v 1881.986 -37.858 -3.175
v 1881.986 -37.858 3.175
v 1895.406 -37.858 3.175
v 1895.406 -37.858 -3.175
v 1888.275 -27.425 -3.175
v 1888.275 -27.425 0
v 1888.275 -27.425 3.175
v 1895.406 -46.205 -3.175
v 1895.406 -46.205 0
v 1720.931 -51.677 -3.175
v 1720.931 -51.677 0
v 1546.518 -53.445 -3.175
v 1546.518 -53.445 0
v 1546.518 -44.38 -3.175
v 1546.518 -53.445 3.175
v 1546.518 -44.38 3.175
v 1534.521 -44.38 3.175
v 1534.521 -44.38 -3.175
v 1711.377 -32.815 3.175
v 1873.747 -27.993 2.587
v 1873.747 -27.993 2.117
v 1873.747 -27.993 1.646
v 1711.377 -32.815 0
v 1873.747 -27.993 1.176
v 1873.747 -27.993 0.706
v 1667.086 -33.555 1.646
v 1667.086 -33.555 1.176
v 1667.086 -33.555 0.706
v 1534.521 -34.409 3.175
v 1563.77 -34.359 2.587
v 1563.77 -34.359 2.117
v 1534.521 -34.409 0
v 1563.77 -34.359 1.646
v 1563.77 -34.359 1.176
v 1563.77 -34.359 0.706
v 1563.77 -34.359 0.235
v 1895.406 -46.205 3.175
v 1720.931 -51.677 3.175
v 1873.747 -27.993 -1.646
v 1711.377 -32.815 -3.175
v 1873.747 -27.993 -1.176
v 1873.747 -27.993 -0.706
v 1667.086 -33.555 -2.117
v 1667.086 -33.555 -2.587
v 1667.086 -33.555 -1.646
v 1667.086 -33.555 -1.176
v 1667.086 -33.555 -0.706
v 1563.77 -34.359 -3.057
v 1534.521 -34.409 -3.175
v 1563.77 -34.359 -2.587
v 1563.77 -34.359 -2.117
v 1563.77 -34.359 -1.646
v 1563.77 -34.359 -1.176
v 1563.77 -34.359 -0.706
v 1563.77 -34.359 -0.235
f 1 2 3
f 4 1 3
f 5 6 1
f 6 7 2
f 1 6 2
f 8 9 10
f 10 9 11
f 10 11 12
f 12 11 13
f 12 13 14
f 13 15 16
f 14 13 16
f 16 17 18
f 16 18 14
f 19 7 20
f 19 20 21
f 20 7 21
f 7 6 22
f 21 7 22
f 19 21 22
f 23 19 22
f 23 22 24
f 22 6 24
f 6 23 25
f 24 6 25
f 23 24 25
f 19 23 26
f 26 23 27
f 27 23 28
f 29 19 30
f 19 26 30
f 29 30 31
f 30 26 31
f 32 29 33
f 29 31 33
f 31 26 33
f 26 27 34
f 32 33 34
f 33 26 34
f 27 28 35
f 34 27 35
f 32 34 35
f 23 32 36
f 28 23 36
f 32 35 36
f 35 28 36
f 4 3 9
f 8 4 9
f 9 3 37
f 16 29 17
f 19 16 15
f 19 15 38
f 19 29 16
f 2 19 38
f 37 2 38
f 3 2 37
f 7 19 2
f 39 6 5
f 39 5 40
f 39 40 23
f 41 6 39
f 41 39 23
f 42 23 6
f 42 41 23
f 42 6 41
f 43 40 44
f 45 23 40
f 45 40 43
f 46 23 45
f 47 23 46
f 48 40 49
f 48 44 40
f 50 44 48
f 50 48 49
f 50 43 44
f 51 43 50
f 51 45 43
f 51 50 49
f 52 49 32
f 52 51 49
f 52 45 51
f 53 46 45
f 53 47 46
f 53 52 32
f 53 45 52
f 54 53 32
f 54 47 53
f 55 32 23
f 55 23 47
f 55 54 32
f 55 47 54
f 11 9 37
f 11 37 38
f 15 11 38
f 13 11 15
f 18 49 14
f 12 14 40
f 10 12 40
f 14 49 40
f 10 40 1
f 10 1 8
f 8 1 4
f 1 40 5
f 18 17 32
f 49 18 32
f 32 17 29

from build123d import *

# Parameters (mm, degrees)
BOSS_EXTRUDE1_DEPTH = 3.175
CUT_EXTRUDE1_DEPTH  = 7.3500001
FILLET1_R           = 2.54
CUT_EXTRUDE2_DEPTH  = 7.62


with BuildPart() as part:
    # Sketch1 → Boss-Extrude1 (new body, symmetric)
    with BuildSketch(Plane.XY):
        with BuildLine():
            Line((499.61002795, -53.470702797), (1046.28548189, -53.470702797))
            add(Edge.make_bspline(
                [(2669.54, -9.569049356), (2615.393603553, -13.17073937), (2561.080658619, -16.536108081), (2506.205230446, -19.758621957), (2430.209106802, -23.505211705), (2354.212983157, -26.631486423), (2332.570330468, -27.480988169), (2156.268639429, -34.377768543), (1979.966947376, -41.628631248), (1824.114277635, -52.771265877), (1636.928606778, -53.579569849), (1449.742935921, -53.454024613), (1418.006730935, -53.470702797), (1324.899336146, -53.470702797), (1231.791940344, -53.470702797), (1170.441269319, -53.470702797), (1108.784075813, -53.470702797), (1047.126882346, -53.470702797), (1046.846414188, -53.470702797), (1046.565947184, -53.470702797), (1046.28548189, -53.470702797)],
                knots=[103.698913506, 103.698913506, 103.698913506, 103.698913506, 103.698913506, 103.698913506, 130.927896619, 130.927896619, 130.927896619, 141.337054719, 141.337054719, 141.337054719, 218.101815019, 218.101815019, 218.101815019, 233.772059419, 233.772059419, 233.772059419, 264.077723219, 264.077723219, 264.077723219, 264.2162088, 264.2162088, 264.2162088, 264.2162088, 264.2162088, 264.2162088], degree=5))
            Line((2669.54, -9.569049356), (2669.54, 9.5231025))
            add(Edge.make_bspline(
                [(2669.54, 9.5231025), (2667.126494524, 9.36235515), (2659.861586685, 8.880281494), (2635.666282302, 7.292469146), (2596.857665529, 4.826056853), (2545.729743039, 1.758344093), (2494.405305707, -1.098555235), (2451.533022267, -3.266573297), (2417.198316756, -4.86708361), (2391.457076919, -6.003589235), (2365.634736307, -7.086854581), (2339.546284672, -8.137729944), (2313.466132974, -9.165138371), (2287.612375486, -10.179478215), (2261.763347437, -11.201032297), (2227.285329715, -12.583842557), (2184.175569393, -14.36607236), (2132.429066114, -16.607427868), (2063.4255234, -19.708920485), (1977.174907635, -23.700543313), (1873.732451432, -28.149389221), (1770.37461881, -31.657468649), (1667.085687813, -33.793117556), (1581.011094491, -34.383188831), (1512.07397126, -34.4278026), (1443.061513477, -34.409510402), (1356.800927879, -34.424432812), (1218.794626954, -34.418464788), (1115.289022786, -34.420702797), (1046.28548189, -34.420702797)],
                knots=[103.571582669, 103.571582669, 103.571582669, 103.571582669, 104.300777207, 105.766098403, 110.877392287, 115.98868617, 121.099980054, 126.211273938, 128.76692088, 131.322567822, 133.878214764, 136.433861706, 138.989508647, 141.545155589, 144.100802531, 146.656449473, 151.767743357, 156.879037241, 161.990331124, 172.212918892, 182.43550666, 192.658094427, 202.880682195, 213.103269962, 218.214563846, 223.32585773, 233.548445497, 243.771033265, 264.2162088, 264.2162088, 264.2162088, 264.2162088], degree=3))
            Line((1046.28548189, -34.420702797), (499.61002795, -34.420702797))
            add(Edge.make_bspline(
                [(499.61002795, -34.420702797), (488.614737518, -34.420702797), (472.236395365, -34.420702798), (449.940231846, -34.420702794), (427.771305695, -34.42070281), (405.874681663, -34.420702712), (384.584909128, -34.420702942), (368.900229326, -34.420702244), (353.376568613, -34.420704862), (332.608466435, -34.420689186), (306.287754853, -34.420570006), (274.023487704, -34.420538256), (252.271015965, -34.420709741), (241.425150134, -34.420702761)],
                knots=[19.90682951, 19.90682951, 19.90682951, 19.90682951, 23.220120017, 24.876765271, 26.533410525, 29.846701033, 31.503346286, 33.15999154, 34.816636794, 36.473282048, 39.786572556, 43.099863063, 46.413153571, 46.413153571, 46.413153571, 46.413153571], degree=3))
            add(Edge.make_bspline(
                [(241.425150134, -34.420702761), (239.394928853, -34.420701455), (235.322322927, -34.420495867), (227.274423443, -34.398702533), (217.319360062, -34.297466855), (205.530690077, -33.976385563), (189.963341914, -33.212641271), (170.696984653, -31.543495194), (147.533261232, -28.314398128), (125.482753206, -24.202109872), (109.358914834, -20.622537553), (100.964116069, -18.612521054), (99.06, -18.149327722)],
                knots=[0, 0, 0, 0, 0.622088422, 1.244176844, 2.488353689, 3.732530533, 4.976707377, 7.465061066, 9.953414755, 12.441768444, 14.55823542, 15.180323842, 15.180323842, 15.180323842, 15.180323842], degree=3))
            Line((99.06, -18.149327722), (99.06, -37.741485304))
            add(Edge.make_bspline(
                [(241.425137875, -53.470702761), (224.286916993, -53.470691732), (207.149474967, -53.467315374), (190.203897513, -52.686577078), (161.734965878, -49.987457476), (133.266034188, -45.175583375), (121.749620566, -42.910592695), (110.349390726, -40.420274627), (99.06, -37.741485304)],
                knots=[0, 0, 0, 0, 0, 0, 8.71381608, 8.71381608, 8.71381608, 14.701907176, 14.701907176, 14.701907176, 14.701907176, 14.701907176, 14.701907176], degree=5))
            add(Edge.make_bspline(
                [(499.61002795, -53.470702797), (492.136820835, -53.470702797), (484.754348064, -53.470702797), (477.443025859, -53.470702797), (448.516583145, -53.470702797), (419.590140517, -53.470702797), (398.368118521, -53.470702797), (355.647540186, -53.470702797), (312.926961851, -53.470702797), (289.235090436, -53.470293029), (265.364963651, -53.470705034), (241.4948369, -53.470702789), (241.471603891, -53.470702785), (241.448370882, -53.470702776), (241.425137875, -53.470702761)],
                knots=[19.90682951, 19.90682951, 19.90682951, 19.90682951, 19.90682951, 19.90682951, 23.637897311, 23.637897311, 23.637897311, 34.276545571, 34.276545571, 34.276545571, 46.401340901, 46.401340901, 46.401340901, 46.413153571, 46.413153571, 46.413153571, 46.413153571, 46.413153571, 46.413153571], degree=5))
        make_face()
    extrude(amount=BOSS_EXTRUDE1_DEPTH, both=True)

    # Sketch2 → Cut-Extrude1 (cut, through all)
    with BuildSketch(Plane.XY.offset(3.175)):
        with BuildLine():
            add(Edge.make_bspline(
                [(2312.9875, -9.183260037), (2304.505441691, -9.516700376), (2287.441020622, -10.186250162), (2261.763347437, -11.201032297), (2228.230552004, -12.545932515), (2203.310445107, -13.575047161), (2187.00995947, -14.263260037)],
                knots=[139.04033329, 139.04033329, 139.04033329, 139.04033329, 141.545155589, 144.100802531, 146.656449473, 151.487488909, 151.487488909, 151.487488909, 151.487488909], degree=3))
            Line((2187.00995947, -14.263260037), (2312.9875, -14.263260037))
            Line((2312.9875, -14.263260037), (2312.9875, -9.183260037))
        make_face()
    extrude(amount=-CUT_EXTRUDE1_DEPTH, mode=Mode.SUBTRACT)

    # Fillet1
    fillet1_edges = [part.edges().sort_by_distance(p)[0] for p in [
        (2669.54, -9.569049356, -1.5875),
        (2669.54, 9.5231025, -1.5875),
        (99.06, -37.741485304, -1.5875),
        (99.06, -18.149327722, -1.5875),
        (2312.9875, -9.183260037, 1.5875),
        (2312.9875, -14.263260037, 0),
    ]]
    fillet(fillet1_edges, radius=FILLET1_R)

    # Sketch3 → Cut-Extrude2 (cut)
    with BuildSketch(Plane.XY.offset(3.175)):
        Polygon((1534.520918045, -34.408934174), (1534.520918045, -44.380222694), (1546.518002564, -44.380222694), (1546.518002564, -53.444776375), (1546.518002564, -106.023211896), (55.693371554, -302.623897547), (0, 180.999666526), (1534.520918045, 89.767095142), align=None)
        Polygon((1888.274985361, -27.424617015), (1881.98614013, -37.858137115), (1895.406326502, -37.858137115), (1895.406326502, -46.204944132), (1895.406326502, -56.664358377), (2711.703422573, -53.444776375), (2711.703422573, 52.291712547), (1888.274985361, 63.130297766), align=None)
    extrude(amount=-CUT_EXTRUDE2_DEPTH, mode=Mode.SUBTRACT)


solid = part.part
